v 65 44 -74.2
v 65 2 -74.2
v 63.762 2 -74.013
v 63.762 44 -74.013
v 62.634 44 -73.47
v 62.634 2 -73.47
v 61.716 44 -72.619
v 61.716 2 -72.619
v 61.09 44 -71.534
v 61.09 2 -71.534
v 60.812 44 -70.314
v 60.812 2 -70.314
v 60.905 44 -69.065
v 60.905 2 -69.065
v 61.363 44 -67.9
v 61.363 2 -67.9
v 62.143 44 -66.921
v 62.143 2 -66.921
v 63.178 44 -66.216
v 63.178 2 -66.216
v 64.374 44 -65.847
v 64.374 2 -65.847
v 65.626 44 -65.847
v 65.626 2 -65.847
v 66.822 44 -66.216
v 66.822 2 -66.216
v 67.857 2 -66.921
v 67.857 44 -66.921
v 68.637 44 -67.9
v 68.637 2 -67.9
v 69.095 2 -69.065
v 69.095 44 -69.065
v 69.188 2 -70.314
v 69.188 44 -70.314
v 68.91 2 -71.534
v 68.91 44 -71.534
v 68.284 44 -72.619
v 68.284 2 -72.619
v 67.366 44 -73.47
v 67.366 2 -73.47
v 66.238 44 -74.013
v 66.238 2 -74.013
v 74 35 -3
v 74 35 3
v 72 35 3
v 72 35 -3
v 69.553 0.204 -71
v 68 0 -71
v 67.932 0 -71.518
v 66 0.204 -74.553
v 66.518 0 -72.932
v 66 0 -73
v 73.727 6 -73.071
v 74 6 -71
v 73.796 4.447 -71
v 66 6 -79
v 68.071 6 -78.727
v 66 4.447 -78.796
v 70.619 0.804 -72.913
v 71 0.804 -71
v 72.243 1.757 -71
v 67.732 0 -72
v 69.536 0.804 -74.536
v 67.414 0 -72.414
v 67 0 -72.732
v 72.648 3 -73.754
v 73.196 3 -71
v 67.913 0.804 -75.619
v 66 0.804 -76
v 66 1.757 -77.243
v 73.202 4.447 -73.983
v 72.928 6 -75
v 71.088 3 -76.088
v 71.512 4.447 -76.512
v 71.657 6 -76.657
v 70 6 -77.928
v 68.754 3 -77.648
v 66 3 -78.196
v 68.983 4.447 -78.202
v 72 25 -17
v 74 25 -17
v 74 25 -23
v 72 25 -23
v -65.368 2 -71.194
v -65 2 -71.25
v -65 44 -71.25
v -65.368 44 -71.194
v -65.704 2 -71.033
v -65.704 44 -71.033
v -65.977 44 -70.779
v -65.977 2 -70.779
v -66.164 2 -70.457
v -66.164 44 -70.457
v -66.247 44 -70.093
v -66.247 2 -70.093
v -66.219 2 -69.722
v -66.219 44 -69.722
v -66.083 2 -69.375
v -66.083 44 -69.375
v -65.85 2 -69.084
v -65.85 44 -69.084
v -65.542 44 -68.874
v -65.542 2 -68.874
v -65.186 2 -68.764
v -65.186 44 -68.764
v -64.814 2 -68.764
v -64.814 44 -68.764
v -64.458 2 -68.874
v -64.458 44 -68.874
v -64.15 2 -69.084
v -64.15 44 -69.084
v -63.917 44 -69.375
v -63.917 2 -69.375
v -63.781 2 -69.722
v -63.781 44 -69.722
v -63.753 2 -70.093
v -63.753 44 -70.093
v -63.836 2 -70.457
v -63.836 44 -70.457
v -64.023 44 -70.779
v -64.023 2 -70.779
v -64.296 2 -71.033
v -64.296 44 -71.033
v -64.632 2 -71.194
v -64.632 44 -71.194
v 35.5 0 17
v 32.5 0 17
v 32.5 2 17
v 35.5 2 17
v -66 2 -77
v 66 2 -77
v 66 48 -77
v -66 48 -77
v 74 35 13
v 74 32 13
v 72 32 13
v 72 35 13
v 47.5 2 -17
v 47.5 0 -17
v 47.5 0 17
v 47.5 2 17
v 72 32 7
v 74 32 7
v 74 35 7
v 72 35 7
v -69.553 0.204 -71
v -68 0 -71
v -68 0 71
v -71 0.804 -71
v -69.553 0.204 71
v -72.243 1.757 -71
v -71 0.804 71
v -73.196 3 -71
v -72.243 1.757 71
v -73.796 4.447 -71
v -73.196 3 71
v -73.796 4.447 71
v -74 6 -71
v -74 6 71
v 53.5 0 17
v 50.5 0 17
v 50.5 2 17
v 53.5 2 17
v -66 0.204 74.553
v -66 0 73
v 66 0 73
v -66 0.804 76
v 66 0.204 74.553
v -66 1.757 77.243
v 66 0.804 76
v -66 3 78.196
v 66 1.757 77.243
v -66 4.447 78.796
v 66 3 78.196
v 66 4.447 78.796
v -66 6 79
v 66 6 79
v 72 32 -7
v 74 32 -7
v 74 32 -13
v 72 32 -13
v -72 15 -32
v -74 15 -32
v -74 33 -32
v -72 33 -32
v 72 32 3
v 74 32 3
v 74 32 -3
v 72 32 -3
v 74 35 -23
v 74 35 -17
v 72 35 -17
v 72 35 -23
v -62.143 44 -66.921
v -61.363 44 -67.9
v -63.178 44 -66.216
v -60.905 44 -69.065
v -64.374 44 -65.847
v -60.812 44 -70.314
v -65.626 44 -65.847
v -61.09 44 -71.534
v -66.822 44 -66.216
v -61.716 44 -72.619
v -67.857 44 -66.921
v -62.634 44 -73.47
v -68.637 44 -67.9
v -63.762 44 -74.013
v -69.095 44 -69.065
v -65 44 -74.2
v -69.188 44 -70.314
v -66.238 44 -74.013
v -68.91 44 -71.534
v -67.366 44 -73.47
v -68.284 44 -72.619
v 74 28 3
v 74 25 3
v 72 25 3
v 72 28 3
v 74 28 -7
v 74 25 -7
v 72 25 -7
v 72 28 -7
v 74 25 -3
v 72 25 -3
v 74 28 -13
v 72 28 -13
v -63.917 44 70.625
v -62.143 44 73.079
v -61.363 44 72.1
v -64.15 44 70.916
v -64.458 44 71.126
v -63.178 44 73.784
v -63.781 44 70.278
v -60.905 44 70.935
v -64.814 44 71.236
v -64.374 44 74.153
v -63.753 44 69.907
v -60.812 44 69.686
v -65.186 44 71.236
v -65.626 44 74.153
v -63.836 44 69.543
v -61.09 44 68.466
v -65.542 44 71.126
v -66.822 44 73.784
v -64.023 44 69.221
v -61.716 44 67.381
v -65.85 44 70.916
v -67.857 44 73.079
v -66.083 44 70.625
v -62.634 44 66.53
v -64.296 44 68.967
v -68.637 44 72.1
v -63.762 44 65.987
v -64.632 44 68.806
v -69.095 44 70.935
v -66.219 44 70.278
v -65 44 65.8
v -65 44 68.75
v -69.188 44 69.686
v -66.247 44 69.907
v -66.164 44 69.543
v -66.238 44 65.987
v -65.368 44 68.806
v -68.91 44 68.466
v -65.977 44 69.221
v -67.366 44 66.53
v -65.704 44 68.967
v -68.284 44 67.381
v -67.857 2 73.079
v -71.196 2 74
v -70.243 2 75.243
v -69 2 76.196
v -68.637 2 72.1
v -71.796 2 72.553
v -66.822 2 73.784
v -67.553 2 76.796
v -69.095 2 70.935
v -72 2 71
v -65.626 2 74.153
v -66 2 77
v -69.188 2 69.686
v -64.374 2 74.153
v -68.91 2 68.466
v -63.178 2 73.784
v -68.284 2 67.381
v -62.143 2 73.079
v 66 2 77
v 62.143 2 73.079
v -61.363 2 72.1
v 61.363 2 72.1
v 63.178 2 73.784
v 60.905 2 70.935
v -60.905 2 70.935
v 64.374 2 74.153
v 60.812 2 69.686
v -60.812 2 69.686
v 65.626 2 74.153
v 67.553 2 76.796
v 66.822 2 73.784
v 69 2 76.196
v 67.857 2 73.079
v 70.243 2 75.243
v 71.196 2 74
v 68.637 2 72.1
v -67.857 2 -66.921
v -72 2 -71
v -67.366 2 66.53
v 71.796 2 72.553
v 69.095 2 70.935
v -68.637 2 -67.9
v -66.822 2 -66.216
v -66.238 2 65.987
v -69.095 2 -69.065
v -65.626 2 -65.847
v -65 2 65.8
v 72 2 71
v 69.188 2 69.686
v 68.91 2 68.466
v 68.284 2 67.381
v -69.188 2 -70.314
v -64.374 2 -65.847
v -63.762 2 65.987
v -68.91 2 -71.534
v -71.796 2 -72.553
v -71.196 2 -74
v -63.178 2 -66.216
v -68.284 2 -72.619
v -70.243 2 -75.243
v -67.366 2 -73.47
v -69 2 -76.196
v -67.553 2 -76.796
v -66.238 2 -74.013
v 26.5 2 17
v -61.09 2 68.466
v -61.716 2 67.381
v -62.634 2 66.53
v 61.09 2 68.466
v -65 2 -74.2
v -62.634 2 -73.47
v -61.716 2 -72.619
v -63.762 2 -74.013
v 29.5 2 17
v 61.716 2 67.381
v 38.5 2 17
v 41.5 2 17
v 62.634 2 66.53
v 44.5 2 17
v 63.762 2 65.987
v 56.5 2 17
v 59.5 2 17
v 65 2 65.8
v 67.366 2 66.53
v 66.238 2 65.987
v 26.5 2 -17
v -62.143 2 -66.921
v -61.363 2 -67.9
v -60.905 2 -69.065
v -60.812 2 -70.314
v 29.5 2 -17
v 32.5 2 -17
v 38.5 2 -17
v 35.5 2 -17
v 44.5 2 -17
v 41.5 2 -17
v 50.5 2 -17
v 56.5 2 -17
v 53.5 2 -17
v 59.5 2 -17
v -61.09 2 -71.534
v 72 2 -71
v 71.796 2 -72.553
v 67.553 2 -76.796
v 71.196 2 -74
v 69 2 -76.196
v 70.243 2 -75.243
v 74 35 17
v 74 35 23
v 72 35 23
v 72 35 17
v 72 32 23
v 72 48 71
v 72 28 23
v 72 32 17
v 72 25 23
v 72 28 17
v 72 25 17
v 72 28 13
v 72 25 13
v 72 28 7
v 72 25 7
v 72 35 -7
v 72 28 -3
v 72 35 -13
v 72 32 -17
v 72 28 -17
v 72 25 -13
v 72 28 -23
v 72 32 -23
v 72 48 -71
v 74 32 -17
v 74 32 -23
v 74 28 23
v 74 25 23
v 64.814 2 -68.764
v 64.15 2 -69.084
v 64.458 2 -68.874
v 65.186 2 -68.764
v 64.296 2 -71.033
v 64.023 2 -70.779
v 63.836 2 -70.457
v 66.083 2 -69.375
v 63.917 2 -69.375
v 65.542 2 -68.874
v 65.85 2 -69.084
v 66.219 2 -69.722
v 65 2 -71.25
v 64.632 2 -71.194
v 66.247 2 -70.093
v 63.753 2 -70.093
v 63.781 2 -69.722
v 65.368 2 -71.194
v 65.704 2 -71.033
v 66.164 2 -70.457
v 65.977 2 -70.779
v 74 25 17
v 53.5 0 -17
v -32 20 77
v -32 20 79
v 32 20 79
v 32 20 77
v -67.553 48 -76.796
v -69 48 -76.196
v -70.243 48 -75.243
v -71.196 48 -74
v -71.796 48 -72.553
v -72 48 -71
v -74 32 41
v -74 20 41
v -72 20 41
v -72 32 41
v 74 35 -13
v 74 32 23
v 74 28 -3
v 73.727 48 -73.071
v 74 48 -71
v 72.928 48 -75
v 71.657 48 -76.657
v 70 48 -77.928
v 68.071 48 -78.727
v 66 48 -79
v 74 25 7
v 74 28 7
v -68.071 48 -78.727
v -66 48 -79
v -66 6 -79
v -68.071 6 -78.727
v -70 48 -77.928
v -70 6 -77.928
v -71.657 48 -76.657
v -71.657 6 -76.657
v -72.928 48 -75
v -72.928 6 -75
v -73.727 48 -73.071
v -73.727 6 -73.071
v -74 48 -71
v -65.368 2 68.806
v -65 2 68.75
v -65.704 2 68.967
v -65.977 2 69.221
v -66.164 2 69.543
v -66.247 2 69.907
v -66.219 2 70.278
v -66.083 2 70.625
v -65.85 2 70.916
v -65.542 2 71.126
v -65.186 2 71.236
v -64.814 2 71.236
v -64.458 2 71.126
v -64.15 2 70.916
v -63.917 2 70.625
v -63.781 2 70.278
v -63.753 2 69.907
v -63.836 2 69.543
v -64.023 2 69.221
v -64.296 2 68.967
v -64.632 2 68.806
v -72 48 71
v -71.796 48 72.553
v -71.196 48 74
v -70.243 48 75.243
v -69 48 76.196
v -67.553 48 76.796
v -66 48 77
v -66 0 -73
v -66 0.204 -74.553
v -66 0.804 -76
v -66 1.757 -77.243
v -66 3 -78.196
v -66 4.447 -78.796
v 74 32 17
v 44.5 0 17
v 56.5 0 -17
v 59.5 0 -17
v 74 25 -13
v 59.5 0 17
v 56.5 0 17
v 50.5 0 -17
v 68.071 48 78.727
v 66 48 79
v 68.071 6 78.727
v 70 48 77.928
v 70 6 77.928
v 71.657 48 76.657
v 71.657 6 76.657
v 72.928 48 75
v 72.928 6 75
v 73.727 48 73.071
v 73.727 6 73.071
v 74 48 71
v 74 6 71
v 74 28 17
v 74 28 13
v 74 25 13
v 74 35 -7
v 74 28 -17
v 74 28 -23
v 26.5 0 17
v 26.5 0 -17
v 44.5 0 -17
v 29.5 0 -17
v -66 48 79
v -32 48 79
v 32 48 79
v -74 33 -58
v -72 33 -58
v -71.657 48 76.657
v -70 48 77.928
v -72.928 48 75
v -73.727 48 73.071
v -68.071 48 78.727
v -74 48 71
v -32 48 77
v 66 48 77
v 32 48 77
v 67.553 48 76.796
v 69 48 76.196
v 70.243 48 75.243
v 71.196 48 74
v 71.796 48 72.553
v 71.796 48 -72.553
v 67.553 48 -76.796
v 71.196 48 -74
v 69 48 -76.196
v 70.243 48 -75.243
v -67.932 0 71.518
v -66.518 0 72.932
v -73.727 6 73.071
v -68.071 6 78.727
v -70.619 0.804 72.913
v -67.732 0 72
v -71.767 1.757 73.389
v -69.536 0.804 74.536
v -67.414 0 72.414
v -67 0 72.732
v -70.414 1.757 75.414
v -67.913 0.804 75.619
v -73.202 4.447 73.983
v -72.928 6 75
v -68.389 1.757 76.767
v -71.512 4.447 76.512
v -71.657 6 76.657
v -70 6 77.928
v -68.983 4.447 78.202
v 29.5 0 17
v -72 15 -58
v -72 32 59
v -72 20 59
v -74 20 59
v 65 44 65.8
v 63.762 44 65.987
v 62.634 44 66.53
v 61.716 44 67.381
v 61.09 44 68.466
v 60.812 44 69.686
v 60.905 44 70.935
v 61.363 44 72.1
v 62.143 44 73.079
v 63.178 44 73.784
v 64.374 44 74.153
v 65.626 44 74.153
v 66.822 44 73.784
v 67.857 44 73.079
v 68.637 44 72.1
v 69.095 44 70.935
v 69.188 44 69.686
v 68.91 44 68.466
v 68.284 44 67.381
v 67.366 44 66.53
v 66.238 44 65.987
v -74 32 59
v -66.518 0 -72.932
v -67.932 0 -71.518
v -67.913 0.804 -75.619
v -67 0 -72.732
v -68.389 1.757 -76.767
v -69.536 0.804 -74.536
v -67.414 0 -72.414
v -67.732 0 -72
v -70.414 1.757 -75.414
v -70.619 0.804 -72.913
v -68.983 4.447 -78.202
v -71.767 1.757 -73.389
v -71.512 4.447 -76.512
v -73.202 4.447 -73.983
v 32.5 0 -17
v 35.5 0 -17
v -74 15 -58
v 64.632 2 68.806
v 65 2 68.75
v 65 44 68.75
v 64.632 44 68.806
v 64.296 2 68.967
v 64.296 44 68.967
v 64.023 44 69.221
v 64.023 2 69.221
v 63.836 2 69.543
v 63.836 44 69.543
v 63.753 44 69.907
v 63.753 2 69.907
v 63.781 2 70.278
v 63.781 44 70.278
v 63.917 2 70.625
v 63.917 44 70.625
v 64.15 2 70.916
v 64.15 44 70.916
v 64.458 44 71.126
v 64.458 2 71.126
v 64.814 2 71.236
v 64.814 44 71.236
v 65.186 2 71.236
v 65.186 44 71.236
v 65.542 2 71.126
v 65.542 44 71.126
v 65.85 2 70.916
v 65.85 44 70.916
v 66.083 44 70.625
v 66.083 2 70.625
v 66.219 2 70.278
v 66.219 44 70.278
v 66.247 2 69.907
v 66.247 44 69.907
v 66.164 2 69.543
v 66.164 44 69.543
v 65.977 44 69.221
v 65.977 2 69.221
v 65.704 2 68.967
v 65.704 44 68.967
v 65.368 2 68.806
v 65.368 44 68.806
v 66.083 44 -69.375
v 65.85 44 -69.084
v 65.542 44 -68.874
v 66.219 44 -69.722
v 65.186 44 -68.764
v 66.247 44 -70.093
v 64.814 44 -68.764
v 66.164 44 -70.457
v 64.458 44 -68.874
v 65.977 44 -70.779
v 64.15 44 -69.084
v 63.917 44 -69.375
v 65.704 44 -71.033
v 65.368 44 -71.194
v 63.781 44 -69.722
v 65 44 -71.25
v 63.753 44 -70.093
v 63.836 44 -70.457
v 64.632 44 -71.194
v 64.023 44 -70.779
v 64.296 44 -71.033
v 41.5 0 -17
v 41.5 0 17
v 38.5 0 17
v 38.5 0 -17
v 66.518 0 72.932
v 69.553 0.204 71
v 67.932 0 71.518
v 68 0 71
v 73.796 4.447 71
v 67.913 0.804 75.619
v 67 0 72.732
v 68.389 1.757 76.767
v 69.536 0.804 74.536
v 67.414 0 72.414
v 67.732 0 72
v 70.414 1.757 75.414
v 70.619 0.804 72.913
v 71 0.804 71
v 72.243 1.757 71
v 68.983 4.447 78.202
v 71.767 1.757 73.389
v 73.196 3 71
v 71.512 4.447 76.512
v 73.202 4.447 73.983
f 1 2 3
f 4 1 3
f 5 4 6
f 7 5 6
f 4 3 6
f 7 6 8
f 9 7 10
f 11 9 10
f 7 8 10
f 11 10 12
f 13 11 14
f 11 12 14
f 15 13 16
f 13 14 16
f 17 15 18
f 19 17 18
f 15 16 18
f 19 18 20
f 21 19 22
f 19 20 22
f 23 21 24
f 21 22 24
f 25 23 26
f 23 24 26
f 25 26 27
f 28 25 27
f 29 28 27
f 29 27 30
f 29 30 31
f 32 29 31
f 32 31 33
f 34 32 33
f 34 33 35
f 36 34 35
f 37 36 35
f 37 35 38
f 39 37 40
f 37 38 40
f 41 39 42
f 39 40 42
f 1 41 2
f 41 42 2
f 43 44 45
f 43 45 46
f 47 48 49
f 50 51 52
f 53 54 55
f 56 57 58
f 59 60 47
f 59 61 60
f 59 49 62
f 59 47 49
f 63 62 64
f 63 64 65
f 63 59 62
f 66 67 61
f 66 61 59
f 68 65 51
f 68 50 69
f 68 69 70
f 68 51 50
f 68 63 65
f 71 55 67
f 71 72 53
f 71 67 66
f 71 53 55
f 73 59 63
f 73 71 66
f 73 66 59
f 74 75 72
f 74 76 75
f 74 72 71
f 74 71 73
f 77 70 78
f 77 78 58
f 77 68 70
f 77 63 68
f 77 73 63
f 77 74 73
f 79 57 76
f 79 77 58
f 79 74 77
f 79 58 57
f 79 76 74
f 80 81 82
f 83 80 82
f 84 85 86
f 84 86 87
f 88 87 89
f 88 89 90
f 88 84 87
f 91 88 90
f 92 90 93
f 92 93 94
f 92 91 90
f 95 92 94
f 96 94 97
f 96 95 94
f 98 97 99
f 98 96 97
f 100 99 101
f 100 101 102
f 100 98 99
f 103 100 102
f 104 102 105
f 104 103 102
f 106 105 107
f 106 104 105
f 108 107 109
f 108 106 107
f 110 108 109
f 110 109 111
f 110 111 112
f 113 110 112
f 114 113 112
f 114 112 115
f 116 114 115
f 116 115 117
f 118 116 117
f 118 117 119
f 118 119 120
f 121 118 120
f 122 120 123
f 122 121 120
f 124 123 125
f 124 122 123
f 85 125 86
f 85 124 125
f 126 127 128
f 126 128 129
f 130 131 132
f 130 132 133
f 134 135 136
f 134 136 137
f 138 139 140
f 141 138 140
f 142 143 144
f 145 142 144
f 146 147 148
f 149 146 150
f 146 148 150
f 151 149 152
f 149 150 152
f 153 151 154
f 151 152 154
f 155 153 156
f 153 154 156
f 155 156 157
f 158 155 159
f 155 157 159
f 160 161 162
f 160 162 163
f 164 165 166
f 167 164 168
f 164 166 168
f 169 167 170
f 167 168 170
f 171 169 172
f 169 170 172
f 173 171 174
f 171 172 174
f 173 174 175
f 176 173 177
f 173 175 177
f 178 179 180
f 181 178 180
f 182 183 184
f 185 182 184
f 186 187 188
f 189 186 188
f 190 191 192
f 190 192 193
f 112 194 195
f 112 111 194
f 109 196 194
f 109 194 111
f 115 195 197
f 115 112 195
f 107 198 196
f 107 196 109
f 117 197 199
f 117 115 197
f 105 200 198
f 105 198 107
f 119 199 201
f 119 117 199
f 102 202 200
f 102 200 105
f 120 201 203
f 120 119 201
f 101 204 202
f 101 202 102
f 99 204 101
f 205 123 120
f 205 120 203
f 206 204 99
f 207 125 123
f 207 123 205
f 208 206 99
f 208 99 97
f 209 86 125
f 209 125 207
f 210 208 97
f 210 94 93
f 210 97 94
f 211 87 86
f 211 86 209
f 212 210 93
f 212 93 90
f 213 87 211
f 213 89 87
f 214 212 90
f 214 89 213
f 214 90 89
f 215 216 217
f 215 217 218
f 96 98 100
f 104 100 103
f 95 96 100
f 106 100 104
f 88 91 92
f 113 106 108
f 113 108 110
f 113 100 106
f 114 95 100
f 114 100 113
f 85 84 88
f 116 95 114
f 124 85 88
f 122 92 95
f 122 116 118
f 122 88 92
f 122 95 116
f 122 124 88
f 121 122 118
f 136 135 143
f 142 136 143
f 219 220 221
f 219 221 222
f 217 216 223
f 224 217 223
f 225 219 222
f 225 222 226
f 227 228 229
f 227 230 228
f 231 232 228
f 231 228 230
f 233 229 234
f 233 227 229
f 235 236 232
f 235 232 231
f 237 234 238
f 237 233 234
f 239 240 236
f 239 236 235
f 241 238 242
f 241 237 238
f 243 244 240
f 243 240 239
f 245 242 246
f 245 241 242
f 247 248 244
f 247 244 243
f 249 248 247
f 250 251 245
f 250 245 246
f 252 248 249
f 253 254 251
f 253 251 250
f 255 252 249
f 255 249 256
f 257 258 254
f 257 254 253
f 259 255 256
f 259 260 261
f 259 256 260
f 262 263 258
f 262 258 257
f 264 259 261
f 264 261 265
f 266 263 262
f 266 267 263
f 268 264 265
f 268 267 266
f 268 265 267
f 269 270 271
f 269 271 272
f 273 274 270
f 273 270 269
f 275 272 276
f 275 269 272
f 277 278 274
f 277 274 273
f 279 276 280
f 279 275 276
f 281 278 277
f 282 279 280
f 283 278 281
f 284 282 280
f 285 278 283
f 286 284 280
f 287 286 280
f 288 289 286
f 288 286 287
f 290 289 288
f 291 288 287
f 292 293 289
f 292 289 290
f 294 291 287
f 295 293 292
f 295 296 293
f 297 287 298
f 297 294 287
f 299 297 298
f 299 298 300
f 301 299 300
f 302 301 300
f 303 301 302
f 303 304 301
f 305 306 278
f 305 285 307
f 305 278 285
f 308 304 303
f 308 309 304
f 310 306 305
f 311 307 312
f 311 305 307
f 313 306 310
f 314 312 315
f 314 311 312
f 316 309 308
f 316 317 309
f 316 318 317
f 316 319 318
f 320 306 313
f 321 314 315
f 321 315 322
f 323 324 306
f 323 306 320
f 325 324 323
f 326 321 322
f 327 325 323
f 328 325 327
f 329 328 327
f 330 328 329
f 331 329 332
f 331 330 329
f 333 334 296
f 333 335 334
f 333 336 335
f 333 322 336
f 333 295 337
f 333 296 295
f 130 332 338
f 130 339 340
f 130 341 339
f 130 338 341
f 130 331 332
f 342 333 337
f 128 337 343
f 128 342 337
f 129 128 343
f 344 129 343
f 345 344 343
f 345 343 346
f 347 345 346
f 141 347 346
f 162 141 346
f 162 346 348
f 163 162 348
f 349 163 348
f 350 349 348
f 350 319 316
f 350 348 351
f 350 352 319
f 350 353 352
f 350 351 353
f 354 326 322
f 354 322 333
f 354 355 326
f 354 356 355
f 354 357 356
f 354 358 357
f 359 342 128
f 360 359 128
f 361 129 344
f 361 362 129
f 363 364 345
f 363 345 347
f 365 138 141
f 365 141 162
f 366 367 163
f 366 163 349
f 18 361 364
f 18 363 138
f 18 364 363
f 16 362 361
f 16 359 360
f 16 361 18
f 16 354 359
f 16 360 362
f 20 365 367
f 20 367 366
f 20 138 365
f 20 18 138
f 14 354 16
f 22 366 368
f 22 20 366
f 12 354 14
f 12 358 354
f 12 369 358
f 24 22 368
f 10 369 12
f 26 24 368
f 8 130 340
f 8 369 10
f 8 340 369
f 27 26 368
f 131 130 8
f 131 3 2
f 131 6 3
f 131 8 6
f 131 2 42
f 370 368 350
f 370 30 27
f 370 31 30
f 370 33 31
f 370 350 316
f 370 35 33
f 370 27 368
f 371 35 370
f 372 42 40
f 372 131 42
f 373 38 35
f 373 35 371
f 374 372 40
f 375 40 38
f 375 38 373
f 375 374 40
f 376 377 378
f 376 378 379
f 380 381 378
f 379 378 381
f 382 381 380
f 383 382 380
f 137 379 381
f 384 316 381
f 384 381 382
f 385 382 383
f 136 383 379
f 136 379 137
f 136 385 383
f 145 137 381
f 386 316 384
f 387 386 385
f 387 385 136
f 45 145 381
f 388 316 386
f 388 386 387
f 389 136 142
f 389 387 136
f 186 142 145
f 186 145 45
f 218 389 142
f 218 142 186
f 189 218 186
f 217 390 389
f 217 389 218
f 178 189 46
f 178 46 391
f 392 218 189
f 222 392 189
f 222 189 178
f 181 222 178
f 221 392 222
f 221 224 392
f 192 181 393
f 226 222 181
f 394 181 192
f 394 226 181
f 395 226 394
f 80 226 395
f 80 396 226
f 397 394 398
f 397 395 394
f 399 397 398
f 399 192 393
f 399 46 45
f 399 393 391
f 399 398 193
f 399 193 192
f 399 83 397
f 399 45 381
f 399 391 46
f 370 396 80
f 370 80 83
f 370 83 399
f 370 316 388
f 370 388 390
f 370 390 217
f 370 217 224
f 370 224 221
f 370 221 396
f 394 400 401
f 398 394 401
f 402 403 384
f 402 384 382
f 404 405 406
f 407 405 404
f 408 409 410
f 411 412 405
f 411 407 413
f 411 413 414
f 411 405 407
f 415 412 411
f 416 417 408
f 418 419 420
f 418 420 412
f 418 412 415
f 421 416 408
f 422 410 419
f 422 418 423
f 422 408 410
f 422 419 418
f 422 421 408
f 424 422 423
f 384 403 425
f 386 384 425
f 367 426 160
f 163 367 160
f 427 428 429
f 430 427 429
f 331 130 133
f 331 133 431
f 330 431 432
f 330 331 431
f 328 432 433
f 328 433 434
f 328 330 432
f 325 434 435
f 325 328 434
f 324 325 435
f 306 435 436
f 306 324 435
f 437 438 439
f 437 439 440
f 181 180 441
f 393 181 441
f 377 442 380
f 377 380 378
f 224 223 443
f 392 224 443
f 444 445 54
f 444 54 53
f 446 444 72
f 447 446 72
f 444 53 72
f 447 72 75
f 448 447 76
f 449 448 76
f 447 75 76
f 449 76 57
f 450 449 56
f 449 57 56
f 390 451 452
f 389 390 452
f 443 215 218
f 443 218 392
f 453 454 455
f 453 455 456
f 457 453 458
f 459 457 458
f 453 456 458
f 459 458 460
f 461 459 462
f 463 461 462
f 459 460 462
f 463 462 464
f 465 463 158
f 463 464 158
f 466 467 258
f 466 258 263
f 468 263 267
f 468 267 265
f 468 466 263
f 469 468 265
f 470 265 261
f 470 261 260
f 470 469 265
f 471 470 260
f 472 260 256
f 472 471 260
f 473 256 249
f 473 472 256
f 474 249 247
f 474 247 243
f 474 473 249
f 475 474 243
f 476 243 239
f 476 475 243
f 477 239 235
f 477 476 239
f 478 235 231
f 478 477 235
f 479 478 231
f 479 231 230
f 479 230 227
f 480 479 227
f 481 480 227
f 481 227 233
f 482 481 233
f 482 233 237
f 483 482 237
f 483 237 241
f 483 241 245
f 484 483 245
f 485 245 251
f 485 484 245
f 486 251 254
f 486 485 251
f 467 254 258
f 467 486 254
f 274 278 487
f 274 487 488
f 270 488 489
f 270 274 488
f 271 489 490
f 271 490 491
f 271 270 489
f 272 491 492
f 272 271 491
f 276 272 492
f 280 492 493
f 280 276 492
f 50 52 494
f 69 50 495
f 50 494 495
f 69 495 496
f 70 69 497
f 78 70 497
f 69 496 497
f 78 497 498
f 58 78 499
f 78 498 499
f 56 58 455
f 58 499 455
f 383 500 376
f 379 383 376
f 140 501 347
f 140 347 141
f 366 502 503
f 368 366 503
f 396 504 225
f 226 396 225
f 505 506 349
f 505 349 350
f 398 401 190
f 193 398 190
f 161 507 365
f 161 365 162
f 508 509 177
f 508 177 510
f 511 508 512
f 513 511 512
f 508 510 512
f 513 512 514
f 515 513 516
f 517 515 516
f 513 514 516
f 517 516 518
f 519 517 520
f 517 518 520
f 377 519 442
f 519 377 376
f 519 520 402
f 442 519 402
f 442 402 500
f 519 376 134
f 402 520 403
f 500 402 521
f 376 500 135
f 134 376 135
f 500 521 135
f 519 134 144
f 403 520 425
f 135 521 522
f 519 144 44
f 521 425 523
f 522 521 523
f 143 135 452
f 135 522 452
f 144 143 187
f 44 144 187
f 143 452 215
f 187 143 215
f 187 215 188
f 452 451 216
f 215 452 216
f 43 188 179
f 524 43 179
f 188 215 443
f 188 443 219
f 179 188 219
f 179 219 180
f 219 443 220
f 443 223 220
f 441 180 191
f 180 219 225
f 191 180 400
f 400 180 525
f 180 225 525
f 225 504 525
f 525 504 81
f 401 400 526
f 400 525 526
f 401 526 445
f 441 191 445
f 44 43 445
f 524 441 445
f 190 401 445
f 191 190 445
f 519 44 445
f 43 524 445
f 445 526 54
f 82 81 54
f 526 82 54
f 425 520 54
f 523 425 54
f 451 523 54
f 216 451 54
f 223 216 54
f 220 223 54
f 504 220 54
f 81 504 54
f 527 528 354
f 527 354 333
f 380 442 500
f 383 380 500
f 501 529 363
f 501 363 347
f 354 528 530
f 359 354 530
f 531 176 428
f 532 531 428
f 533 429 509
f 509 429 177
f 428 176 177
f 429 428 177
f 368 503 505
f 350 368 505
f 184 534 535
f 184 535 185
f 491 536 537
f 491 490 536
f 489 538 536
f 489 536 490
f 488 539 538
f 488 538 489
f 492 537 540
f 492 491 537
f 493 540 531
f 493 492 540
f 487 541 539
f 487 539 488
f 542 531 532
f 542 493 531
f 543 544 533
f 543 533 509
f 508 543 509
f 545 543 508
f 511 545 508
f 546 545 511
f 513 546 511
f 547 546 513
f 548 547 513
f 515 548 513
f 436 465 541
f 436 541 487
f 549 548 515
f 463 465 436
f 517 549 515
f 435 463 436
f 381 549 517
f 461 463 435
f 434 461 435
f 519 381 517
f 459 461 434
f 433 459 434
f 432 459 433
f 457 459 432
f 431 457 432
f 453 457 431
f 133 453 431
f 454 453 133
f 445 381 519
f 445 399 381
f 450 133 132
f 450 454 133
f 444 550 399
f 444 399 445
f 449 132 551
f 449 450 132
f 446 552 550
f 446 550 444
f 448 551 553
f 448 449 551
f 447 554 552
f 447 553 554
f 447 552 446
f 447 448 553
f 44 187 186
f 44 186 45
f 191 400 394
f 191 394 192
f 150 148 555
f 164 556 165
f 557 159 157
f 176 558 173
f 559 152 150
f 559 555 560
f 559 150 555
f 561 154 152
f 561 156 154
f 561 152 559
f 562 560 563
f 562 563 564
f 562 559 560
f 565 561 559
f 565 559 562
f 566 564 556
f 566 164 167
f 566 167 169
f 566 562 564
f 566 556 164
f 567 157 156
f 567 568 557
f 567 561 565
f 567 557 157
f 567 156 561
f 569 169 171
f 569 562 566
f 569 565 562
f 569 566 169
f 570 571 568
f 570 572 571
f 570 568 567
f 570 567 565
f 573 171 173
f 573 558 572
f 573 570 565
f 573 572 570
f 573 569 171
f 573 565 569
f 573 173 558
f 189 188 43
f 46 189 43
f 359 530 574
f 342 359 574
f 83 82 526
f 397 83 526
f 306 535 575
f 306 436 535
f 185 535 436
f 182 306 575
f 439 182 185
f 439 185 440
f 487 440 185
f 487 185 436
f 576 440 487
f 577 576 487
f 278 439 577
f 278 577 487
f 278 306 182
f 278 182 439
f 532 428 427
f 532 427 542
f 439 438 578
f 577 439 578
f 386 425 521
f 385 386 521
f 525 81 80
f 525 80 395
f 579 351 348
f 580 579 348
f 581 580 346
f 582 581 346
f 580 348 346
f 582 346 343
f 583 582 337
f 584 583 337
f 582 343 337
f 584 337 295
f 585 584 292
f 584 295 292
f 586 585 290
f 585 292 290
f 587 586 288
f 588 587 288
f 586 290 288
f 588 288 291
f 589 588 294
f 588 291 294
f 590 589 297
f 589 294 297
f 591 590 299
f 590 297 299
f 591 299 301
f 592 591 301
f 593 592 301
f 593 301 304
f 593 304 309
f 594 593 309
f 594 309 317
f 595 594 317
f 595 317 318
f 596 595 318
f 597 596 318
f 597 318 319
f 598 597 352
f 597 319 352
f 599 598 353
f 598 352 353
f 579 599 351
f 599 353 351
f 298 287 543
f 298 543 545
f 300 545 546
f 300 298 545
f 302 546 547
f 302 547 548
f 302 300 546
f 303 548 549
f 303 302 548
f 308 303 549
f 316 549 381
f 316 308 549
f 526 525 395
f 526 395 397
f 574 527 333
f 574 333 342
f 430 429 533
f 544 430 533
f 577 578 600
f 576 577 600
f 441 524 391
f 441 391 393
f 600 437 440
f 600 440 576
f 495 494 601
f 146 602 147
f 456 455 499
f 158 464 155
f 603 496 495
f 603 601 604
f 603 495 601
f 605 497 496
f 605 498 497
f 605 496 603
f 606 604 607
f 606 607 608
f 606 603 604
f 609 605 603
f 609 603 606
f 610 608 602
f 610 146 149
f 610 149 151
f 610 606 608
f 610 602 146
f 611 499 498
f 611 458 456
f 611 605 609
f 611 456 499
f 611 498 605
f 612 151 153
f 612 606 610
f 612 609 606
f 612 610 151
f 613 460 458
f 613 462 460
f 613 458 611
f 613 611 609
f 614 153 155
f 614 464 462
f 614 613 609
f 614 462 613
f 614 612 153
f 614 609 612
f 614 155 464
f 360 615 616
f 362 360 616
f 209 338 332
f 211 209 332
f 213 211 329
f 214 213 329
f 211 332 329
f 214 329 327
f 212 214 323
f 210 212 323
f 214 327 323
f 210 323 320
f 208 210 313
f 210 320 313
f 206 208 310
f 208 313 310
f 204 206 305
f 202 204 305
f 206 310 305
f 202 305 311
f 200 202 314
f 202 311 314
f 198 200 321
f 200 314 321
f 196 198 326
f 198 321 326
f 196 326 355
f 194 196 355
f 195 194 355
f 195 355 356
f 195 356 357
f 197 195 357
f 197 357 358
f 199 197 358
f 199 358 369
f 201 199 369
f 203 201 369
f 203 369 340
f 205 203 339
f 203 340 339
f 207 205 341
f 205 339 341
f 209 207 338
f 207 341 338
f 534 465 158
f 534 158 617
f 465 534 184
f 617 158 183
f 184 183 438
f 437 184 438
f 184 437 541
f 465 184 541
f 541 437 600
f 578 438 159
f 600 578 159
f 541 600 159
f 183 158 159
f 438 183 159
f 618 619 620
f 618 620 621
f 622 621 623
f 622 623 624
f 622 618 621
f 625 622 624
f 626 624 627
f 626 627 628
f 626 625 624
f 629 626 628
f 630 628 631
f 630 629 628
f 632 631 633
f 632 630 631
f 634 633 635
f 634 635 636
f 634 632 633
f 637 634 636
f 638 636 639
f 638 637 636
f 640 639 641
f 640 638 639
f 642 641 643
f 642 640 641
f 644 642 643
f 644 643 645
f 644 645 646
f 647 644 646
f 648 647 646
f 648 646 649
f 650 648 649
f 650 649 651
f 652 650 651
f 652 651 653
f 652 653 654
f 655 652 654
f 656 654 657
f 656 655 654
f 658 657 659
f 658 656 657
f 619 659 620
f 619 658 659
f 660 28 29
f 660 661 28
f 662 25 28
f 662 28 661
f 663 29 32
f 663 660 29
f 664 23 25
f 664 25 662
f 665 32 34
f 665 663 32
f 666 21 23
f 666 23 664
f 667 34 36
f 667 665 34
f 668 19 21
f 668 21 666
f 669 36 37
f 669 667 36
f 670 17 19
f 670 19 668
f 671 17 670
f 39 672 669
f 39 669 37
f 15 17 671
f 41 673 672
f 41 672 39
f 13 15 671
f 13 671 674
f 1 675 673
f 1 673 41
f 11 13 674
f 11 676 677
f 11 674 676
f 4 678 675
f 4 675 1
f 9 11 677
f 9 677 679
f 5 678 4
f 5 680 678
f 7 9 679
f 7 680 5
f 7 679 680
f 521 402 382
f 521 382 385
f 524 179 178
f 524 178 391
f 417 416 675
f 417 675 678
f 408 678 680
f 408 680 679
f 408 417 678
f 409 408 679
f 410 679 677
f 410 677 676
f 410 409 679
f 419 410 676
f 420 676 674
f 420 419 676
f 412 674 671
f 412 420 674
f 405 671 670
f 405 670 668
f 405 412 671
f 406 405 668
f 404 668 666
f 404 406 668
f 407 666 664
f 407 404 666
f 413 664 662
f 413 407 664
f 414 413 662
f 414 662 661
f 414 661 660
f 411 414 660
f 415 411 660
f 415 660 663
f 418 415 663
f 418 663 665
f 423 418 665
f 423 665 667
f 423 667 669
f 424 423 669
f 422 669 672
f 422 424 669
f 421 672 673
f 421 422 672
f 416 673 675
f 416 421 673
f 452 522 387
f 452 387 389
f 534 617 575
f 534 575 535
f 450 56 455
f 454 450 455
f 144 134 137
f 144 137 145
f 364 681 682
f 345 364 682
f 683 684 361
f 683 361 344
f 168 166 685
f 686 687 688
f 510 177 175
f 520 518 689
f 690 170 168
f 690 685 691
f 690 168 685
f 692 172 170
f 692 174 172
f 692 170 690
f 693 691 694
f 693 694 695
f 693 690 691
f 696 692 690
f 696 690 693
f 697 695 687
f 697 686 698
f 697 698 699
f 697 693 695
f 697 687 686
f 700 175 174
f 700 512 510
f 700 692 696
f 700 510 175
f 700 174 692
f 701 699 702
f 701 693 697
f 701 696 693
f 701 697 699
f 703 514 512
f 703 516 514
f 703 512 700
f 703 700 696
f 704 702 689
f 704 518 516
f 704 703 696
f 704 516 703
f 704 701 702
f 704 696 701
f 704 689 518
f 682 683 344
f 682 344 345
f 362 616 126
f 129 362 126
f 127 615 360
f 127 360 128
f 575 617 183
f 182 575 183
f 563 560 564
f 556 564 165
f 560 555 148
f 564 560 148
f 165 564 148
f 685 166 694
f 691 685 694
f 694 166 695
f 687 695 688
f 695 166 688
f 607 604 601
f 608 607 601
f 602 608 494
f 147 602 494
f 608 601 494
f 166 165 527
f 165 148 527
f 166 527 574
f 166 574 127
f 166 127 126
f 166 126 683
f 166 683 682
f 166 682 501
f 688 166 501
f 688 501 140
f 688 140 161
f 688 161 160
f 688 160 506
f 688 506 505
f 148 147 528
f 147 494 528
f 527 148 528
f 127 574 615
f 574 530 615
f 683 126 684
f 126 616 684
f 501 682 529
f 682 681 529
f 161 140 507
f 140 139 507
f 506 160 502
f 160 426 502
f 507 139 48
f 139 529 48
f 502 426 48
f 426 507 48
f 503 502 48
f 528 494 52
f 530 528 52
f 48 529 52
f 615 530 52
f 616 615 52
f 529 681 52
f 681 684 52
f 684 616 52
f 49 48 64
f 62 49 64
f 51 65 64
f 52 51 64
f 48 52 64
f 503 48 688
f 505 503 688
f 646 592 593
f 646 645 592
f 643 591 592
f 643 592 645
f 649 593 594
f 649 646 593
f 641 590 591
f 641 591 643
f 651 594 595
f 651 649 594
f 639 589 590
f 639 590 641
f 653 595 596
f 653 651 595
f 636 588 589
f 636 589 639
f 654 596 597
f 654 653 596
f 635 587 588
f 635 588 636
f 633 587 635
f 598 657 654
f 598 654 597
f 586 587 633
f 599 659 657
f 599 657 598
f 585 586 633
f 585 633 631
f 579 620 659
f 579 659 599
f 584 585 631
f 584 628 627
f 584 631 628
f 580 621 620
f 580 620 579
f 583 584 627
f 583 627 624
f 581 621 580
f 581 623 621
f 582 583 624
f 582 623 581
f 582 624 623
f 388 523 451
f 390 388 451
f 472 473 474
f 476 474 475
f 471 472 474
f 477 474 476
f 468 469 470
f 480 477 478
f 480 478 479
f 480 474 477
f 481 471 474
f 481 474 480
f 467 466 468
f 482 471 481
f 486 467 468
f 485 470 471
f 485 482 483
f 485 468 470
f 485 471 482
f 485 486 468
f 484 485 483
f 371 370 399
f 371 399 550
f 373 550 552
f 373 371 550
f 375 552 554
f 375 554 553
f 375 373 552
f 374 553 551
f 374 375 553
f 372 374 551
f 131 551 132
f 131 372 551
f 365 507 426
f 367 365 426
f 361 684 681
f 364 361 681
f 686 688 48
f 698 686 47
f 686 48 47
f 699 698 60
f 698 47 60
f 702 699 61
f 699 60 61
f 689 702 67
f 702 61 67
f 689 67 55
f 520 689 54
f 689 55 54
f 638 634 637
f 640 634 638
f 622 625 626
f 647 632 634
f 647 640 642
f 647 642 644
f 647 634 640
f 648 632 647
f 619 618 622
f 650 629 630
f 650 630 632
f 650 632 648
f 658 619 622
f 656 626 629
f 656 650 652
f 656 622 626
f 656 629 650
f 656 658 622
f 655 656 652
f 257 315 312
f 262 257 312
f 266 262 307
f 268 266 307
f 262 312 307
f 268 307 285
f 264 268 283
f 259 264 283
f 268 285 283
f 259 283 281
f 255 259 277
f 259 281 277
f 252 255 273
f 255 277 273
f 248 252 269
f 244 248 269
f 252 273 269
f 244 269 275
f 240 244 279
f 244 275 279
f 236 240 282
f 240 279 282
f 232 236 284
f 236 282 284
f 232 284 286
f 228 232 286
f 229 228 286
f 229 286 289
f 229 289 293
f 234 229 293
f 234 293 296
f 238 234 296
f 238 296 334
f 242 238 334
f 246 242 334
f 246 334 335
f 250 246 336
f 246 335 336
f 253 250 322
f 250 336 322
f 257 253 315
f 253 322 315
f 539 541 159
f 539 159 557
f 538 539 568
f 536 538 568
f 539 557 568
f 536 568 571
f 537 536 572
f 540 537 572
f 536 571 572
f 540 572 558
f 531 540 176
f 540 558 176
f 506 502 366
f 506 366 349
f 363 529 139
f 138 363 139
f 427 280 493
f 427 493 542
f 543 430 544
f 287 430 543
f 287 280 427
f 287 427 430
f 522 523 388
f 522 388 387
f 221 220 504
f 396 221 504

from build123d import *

# Parameters (mm, degrees)
BOSS_EXTRUDE1_DEPTH = 2
BOSS_EXTRUDE2_DEPTH = 46
SKETCH5_R           = 4.2
SKETCH5_R_2         = 1.25
BOSS_EXTRUDE3_DEPTH = 42
FILLET1_R           = 6
SKETCH7_W           = 18
SKETCH7_H           = 12
SKETCH7_W_2         = 26
SKETCH7_H_2         = 18
CUT_EXTRUDE5_DEPTH  = 2
SKETCH9_W           = 6
SKETCH9_H           = 3
CUT_EXTRUDE7_DEPTH  = 2
SKETCH10_W          = 64
SKETCH10_H          = 28
CUT_EXTRUDE8_DEPTH  = 2
SKETCH11_W          = 3
SKETCH11_H          = 34
CUT_EXTRUDE9_DEPTH  = 2


with BuildPart() as part:
    # Sketch3 → Boss-Extrude1 (new body)
    with BuildSketch(Plane(origin=(0, 0, 0), x_dir=(1, 0, 0), z_dir=(0, 1, 0))):
        with BuildLine():
            Line((-66, -79), (66, -79))
            ThreePointArc((66, -79), (71.656854249, -76.656854249), (74, -71))
            Line((74, -71), (74, 71))
            ThreePointArc((74, 71), (71.656854249, 76.656854249), (66, 79))
            Line((66, 79), (-66, 79))
            ThreePointArc((-66, 79), (-71.656854249, 76.656854249), (-74, 71))
            Line((-74, 71), (-74, -71))
            ThreePointArc((-74, -71), (-71.656854249, -76.656854249), (-66, -79))
        make_face()
    extrude(amount=BOSS_EXTRUDE1_DEPTH)

    # Sketch4 → Boss-Extrude2 (add)
    with BuildSketch(Plane(origin=(0, 2, 0), x_dir=(1, 0, 0), z_dir=(0, 1, 0))):
        with BuildLine():
            Line((-66, -79), (66, -79))
            ThreePointArc((66, -79), (71.656854249, -76.656854249), (74, -71))
            Line((74, -71), (74, 71))
            ThreePointArc((74, 71), (71.656854249, 76.656854249), (66, 79))
            Line((66, 79), (-66, 79))
            ThreePointArc((-66, 79), (-71.656854249, 76.656854249), (-74, 71))
            Line((-74, 71), (-74, -71))
            ThreePointArc((-74, -71), (-71.656854249, -76.656854249), (-66, -79))
        make_face()
        with BuildLine():
            Line((-66, -77), (66, -77))
            ThreePointArc((66, -77), (70.242640687, -75.242640687), (72, -71))
            Line((72, -71), (72, 71))
            ThreePointArc((72, 71), (70.242640687, 75.242640687), (66, 77))
            Line((66, 77), (-66, 77))
            ThreePointArc((-66, 77), (-70.242640687, 75.242640687), (-72, 71))
            Line((-72, 71), (-72, -71))
            ThreePointArc((-72, -71), (-70.242640687, -75.242640687), (-66, -77))
        make_face(mode=Mode.SUBTRACT)
    extrude(amount=BOSS_EXTRUDE2_DEPTH)

    # Sketch5 → Boss-Extrude3 (add)
    # profile 1 of 4: a face of its own
    with BuildSketch(Plane(origin=(0, 2, 0), x_dir=(1, 0, 0), z_dir=(0, 1, 0))):
        with Locations((-65, 70)):
            Circle(SKETCH5_R)
        with Locations((-65, 70)):
            Circle(SKETCH5_R_2, mode=Mode.SUBTRACT)
    # profile 2 of 4: a face of its own
    with BuildSketch(Plane(origin=(0, 2, 0), x_dir=(1, 0, 0), z_dir=(0, 1, 0))):
        with Locations((65, 70)):
            Circle(SKETCH5_R)
        with Locations((65, 70)):
            Circle(SKETCH5_R_2, mode=Mode.SUBTRACT)
    # profile 3 of 4: a face of its own
    with BuildSketch(Plane(origin=(0, 2, 0), x_dir=(1, 0, 0), z_dir=(0, 1, 0))):
        with Locations((65, -70)):
            Circle(SKETCH5_R)
        with Locations((65, -70)):
            Circle(SKETCH5_R_2, mode=Mode.SUBTRACT)
    # profile 4 of 4: a face of its own
    with BuildSketch(Plane(origin=(0, 2, 0), x_dir=(1, 0, 0), z_dir=(0, 1, 0))):
        with Locations((-65, -70)):
            Circle(SKETCH5_R)
        with Locations((-65, -70)):
            Circle(SKETCH5_R_2, mode=Mode.SUBTRACT)
    extrude(amount=BOSS_EXTRUDE3_DEPTH)

    # Fillet1
    fillet1_edges = [part.edges().sort_by_distance(p)[0] for p in [
        (-71.656854249, 0, 76.656854249),
        (-71.656854249, 0, -76.656854249),
        (-74, 0, 0),
        (71.656854249, 0, -76.656854249),
        (0, 0, -79),
        (74, 0, 0),
        (71.656854249, 0, 76.656854249),
        (0, 0, 79),
    ]]
    fillet(fillet1_edges, radius=FILLET1_R)

    # Sketch7 → Cut-Extrude5 (cut)
    with BuildSketch(Plane.ZY.offset(74)):
        with Locations((50, 26)):
            Rectangle(SKETCH7_W, SKETCH7_H)
        with Locations((-45, 24)):
            Rectangle(SKETCH7_W_2, SKETCH7_H_2)
    extrude(amount=-CUT_EXTRUDE5_DEPTH, mode=Mode.SUBTRACT)

    # Sketch9 → Cut-Extrude7 (cut)
    with BuildSketch(Plane(origin=(74, 0, 0), x_dir=(0, 0, -1), z_dir=(1, 0, 0))):
        with Locations((0, 33.5)):
            Rectangle(SKETCH9_W, SKETCH9_H)
        with Locations((0, 26.5)):
            Rectangle(SKETCH9_W, SKETCH9_H)
        with Locations((-10, 33.5)):
            Rectangle(SKETCH9_W, SKETCH9_H)
        with Locations((-10, 26.5)):
            Rectangle(SKETCH9_W, SKETCH9_H)
        with Locations((-20, 26.5)):
            Rectangle(SKETCH9_W, SKETCH9_H)
        with Locations((-20, 33.5)):
            Rectangle(SKETCH9_W, SKETCH9_H)
        with Locations((20, 33.5)):
            Rectangle(SKETCH9_W, SKETCH9_H)
        with Locations((20, 26.5)):
            Rectangle(SKETCH9_W, SKETCH9_H)
        with Locations((10, 26.5)):
            Rectangle(SKETCH9_W, SKETCH9_H)
        with Locations((10, 33.5)):
            Rectangle(SKETCH9_W, SKETCH9_H)
    extrude(amount=-CUT_EXTRUDE7_DEPTH, mode=Mode.SUBTRACT)

    # Sketch10 → Cut-Extrude8 (cut)
    with BuildSketch(Plane.XY.offset(79)):
        with Locations((0, 34)):
            Rectangle(SKETCH10_W, SKETCH10_H)
    extrude(amount=-CUT_EXTRUDE8_DEPTH, mode=Mode.SUBTRACT)

    # Sketch11 → Cut-Extrude9 (cut)
    with BuildSketch(Plane.XZ):
        with Locations((58, 0)):
            Rectangle(SKETCH11_W, SKETCH11_H)
        with Locations((46, 0)):
            Rectangle(SKETCH11_W, SKETCH11_H)
        with Locations((52, 0)):
            Rectangle(SKETCH11_W, SKETCH11_H)
        with Locations((40, 0)):
            Rectangle(SKETCH11_W, SKETCH11_H)
        with Locations((34, 0)):
            Rectangle(SKETCH11_W, SKETCH11_H)
        with Locations((28, 0)):
            Rectangle(SKETCH11_W, SKETCH11_H)
    extrude(amount=-CUT_EXTRUDE9_DEPTH, mode=Mode.SUBTRACT)


solid = part.part
